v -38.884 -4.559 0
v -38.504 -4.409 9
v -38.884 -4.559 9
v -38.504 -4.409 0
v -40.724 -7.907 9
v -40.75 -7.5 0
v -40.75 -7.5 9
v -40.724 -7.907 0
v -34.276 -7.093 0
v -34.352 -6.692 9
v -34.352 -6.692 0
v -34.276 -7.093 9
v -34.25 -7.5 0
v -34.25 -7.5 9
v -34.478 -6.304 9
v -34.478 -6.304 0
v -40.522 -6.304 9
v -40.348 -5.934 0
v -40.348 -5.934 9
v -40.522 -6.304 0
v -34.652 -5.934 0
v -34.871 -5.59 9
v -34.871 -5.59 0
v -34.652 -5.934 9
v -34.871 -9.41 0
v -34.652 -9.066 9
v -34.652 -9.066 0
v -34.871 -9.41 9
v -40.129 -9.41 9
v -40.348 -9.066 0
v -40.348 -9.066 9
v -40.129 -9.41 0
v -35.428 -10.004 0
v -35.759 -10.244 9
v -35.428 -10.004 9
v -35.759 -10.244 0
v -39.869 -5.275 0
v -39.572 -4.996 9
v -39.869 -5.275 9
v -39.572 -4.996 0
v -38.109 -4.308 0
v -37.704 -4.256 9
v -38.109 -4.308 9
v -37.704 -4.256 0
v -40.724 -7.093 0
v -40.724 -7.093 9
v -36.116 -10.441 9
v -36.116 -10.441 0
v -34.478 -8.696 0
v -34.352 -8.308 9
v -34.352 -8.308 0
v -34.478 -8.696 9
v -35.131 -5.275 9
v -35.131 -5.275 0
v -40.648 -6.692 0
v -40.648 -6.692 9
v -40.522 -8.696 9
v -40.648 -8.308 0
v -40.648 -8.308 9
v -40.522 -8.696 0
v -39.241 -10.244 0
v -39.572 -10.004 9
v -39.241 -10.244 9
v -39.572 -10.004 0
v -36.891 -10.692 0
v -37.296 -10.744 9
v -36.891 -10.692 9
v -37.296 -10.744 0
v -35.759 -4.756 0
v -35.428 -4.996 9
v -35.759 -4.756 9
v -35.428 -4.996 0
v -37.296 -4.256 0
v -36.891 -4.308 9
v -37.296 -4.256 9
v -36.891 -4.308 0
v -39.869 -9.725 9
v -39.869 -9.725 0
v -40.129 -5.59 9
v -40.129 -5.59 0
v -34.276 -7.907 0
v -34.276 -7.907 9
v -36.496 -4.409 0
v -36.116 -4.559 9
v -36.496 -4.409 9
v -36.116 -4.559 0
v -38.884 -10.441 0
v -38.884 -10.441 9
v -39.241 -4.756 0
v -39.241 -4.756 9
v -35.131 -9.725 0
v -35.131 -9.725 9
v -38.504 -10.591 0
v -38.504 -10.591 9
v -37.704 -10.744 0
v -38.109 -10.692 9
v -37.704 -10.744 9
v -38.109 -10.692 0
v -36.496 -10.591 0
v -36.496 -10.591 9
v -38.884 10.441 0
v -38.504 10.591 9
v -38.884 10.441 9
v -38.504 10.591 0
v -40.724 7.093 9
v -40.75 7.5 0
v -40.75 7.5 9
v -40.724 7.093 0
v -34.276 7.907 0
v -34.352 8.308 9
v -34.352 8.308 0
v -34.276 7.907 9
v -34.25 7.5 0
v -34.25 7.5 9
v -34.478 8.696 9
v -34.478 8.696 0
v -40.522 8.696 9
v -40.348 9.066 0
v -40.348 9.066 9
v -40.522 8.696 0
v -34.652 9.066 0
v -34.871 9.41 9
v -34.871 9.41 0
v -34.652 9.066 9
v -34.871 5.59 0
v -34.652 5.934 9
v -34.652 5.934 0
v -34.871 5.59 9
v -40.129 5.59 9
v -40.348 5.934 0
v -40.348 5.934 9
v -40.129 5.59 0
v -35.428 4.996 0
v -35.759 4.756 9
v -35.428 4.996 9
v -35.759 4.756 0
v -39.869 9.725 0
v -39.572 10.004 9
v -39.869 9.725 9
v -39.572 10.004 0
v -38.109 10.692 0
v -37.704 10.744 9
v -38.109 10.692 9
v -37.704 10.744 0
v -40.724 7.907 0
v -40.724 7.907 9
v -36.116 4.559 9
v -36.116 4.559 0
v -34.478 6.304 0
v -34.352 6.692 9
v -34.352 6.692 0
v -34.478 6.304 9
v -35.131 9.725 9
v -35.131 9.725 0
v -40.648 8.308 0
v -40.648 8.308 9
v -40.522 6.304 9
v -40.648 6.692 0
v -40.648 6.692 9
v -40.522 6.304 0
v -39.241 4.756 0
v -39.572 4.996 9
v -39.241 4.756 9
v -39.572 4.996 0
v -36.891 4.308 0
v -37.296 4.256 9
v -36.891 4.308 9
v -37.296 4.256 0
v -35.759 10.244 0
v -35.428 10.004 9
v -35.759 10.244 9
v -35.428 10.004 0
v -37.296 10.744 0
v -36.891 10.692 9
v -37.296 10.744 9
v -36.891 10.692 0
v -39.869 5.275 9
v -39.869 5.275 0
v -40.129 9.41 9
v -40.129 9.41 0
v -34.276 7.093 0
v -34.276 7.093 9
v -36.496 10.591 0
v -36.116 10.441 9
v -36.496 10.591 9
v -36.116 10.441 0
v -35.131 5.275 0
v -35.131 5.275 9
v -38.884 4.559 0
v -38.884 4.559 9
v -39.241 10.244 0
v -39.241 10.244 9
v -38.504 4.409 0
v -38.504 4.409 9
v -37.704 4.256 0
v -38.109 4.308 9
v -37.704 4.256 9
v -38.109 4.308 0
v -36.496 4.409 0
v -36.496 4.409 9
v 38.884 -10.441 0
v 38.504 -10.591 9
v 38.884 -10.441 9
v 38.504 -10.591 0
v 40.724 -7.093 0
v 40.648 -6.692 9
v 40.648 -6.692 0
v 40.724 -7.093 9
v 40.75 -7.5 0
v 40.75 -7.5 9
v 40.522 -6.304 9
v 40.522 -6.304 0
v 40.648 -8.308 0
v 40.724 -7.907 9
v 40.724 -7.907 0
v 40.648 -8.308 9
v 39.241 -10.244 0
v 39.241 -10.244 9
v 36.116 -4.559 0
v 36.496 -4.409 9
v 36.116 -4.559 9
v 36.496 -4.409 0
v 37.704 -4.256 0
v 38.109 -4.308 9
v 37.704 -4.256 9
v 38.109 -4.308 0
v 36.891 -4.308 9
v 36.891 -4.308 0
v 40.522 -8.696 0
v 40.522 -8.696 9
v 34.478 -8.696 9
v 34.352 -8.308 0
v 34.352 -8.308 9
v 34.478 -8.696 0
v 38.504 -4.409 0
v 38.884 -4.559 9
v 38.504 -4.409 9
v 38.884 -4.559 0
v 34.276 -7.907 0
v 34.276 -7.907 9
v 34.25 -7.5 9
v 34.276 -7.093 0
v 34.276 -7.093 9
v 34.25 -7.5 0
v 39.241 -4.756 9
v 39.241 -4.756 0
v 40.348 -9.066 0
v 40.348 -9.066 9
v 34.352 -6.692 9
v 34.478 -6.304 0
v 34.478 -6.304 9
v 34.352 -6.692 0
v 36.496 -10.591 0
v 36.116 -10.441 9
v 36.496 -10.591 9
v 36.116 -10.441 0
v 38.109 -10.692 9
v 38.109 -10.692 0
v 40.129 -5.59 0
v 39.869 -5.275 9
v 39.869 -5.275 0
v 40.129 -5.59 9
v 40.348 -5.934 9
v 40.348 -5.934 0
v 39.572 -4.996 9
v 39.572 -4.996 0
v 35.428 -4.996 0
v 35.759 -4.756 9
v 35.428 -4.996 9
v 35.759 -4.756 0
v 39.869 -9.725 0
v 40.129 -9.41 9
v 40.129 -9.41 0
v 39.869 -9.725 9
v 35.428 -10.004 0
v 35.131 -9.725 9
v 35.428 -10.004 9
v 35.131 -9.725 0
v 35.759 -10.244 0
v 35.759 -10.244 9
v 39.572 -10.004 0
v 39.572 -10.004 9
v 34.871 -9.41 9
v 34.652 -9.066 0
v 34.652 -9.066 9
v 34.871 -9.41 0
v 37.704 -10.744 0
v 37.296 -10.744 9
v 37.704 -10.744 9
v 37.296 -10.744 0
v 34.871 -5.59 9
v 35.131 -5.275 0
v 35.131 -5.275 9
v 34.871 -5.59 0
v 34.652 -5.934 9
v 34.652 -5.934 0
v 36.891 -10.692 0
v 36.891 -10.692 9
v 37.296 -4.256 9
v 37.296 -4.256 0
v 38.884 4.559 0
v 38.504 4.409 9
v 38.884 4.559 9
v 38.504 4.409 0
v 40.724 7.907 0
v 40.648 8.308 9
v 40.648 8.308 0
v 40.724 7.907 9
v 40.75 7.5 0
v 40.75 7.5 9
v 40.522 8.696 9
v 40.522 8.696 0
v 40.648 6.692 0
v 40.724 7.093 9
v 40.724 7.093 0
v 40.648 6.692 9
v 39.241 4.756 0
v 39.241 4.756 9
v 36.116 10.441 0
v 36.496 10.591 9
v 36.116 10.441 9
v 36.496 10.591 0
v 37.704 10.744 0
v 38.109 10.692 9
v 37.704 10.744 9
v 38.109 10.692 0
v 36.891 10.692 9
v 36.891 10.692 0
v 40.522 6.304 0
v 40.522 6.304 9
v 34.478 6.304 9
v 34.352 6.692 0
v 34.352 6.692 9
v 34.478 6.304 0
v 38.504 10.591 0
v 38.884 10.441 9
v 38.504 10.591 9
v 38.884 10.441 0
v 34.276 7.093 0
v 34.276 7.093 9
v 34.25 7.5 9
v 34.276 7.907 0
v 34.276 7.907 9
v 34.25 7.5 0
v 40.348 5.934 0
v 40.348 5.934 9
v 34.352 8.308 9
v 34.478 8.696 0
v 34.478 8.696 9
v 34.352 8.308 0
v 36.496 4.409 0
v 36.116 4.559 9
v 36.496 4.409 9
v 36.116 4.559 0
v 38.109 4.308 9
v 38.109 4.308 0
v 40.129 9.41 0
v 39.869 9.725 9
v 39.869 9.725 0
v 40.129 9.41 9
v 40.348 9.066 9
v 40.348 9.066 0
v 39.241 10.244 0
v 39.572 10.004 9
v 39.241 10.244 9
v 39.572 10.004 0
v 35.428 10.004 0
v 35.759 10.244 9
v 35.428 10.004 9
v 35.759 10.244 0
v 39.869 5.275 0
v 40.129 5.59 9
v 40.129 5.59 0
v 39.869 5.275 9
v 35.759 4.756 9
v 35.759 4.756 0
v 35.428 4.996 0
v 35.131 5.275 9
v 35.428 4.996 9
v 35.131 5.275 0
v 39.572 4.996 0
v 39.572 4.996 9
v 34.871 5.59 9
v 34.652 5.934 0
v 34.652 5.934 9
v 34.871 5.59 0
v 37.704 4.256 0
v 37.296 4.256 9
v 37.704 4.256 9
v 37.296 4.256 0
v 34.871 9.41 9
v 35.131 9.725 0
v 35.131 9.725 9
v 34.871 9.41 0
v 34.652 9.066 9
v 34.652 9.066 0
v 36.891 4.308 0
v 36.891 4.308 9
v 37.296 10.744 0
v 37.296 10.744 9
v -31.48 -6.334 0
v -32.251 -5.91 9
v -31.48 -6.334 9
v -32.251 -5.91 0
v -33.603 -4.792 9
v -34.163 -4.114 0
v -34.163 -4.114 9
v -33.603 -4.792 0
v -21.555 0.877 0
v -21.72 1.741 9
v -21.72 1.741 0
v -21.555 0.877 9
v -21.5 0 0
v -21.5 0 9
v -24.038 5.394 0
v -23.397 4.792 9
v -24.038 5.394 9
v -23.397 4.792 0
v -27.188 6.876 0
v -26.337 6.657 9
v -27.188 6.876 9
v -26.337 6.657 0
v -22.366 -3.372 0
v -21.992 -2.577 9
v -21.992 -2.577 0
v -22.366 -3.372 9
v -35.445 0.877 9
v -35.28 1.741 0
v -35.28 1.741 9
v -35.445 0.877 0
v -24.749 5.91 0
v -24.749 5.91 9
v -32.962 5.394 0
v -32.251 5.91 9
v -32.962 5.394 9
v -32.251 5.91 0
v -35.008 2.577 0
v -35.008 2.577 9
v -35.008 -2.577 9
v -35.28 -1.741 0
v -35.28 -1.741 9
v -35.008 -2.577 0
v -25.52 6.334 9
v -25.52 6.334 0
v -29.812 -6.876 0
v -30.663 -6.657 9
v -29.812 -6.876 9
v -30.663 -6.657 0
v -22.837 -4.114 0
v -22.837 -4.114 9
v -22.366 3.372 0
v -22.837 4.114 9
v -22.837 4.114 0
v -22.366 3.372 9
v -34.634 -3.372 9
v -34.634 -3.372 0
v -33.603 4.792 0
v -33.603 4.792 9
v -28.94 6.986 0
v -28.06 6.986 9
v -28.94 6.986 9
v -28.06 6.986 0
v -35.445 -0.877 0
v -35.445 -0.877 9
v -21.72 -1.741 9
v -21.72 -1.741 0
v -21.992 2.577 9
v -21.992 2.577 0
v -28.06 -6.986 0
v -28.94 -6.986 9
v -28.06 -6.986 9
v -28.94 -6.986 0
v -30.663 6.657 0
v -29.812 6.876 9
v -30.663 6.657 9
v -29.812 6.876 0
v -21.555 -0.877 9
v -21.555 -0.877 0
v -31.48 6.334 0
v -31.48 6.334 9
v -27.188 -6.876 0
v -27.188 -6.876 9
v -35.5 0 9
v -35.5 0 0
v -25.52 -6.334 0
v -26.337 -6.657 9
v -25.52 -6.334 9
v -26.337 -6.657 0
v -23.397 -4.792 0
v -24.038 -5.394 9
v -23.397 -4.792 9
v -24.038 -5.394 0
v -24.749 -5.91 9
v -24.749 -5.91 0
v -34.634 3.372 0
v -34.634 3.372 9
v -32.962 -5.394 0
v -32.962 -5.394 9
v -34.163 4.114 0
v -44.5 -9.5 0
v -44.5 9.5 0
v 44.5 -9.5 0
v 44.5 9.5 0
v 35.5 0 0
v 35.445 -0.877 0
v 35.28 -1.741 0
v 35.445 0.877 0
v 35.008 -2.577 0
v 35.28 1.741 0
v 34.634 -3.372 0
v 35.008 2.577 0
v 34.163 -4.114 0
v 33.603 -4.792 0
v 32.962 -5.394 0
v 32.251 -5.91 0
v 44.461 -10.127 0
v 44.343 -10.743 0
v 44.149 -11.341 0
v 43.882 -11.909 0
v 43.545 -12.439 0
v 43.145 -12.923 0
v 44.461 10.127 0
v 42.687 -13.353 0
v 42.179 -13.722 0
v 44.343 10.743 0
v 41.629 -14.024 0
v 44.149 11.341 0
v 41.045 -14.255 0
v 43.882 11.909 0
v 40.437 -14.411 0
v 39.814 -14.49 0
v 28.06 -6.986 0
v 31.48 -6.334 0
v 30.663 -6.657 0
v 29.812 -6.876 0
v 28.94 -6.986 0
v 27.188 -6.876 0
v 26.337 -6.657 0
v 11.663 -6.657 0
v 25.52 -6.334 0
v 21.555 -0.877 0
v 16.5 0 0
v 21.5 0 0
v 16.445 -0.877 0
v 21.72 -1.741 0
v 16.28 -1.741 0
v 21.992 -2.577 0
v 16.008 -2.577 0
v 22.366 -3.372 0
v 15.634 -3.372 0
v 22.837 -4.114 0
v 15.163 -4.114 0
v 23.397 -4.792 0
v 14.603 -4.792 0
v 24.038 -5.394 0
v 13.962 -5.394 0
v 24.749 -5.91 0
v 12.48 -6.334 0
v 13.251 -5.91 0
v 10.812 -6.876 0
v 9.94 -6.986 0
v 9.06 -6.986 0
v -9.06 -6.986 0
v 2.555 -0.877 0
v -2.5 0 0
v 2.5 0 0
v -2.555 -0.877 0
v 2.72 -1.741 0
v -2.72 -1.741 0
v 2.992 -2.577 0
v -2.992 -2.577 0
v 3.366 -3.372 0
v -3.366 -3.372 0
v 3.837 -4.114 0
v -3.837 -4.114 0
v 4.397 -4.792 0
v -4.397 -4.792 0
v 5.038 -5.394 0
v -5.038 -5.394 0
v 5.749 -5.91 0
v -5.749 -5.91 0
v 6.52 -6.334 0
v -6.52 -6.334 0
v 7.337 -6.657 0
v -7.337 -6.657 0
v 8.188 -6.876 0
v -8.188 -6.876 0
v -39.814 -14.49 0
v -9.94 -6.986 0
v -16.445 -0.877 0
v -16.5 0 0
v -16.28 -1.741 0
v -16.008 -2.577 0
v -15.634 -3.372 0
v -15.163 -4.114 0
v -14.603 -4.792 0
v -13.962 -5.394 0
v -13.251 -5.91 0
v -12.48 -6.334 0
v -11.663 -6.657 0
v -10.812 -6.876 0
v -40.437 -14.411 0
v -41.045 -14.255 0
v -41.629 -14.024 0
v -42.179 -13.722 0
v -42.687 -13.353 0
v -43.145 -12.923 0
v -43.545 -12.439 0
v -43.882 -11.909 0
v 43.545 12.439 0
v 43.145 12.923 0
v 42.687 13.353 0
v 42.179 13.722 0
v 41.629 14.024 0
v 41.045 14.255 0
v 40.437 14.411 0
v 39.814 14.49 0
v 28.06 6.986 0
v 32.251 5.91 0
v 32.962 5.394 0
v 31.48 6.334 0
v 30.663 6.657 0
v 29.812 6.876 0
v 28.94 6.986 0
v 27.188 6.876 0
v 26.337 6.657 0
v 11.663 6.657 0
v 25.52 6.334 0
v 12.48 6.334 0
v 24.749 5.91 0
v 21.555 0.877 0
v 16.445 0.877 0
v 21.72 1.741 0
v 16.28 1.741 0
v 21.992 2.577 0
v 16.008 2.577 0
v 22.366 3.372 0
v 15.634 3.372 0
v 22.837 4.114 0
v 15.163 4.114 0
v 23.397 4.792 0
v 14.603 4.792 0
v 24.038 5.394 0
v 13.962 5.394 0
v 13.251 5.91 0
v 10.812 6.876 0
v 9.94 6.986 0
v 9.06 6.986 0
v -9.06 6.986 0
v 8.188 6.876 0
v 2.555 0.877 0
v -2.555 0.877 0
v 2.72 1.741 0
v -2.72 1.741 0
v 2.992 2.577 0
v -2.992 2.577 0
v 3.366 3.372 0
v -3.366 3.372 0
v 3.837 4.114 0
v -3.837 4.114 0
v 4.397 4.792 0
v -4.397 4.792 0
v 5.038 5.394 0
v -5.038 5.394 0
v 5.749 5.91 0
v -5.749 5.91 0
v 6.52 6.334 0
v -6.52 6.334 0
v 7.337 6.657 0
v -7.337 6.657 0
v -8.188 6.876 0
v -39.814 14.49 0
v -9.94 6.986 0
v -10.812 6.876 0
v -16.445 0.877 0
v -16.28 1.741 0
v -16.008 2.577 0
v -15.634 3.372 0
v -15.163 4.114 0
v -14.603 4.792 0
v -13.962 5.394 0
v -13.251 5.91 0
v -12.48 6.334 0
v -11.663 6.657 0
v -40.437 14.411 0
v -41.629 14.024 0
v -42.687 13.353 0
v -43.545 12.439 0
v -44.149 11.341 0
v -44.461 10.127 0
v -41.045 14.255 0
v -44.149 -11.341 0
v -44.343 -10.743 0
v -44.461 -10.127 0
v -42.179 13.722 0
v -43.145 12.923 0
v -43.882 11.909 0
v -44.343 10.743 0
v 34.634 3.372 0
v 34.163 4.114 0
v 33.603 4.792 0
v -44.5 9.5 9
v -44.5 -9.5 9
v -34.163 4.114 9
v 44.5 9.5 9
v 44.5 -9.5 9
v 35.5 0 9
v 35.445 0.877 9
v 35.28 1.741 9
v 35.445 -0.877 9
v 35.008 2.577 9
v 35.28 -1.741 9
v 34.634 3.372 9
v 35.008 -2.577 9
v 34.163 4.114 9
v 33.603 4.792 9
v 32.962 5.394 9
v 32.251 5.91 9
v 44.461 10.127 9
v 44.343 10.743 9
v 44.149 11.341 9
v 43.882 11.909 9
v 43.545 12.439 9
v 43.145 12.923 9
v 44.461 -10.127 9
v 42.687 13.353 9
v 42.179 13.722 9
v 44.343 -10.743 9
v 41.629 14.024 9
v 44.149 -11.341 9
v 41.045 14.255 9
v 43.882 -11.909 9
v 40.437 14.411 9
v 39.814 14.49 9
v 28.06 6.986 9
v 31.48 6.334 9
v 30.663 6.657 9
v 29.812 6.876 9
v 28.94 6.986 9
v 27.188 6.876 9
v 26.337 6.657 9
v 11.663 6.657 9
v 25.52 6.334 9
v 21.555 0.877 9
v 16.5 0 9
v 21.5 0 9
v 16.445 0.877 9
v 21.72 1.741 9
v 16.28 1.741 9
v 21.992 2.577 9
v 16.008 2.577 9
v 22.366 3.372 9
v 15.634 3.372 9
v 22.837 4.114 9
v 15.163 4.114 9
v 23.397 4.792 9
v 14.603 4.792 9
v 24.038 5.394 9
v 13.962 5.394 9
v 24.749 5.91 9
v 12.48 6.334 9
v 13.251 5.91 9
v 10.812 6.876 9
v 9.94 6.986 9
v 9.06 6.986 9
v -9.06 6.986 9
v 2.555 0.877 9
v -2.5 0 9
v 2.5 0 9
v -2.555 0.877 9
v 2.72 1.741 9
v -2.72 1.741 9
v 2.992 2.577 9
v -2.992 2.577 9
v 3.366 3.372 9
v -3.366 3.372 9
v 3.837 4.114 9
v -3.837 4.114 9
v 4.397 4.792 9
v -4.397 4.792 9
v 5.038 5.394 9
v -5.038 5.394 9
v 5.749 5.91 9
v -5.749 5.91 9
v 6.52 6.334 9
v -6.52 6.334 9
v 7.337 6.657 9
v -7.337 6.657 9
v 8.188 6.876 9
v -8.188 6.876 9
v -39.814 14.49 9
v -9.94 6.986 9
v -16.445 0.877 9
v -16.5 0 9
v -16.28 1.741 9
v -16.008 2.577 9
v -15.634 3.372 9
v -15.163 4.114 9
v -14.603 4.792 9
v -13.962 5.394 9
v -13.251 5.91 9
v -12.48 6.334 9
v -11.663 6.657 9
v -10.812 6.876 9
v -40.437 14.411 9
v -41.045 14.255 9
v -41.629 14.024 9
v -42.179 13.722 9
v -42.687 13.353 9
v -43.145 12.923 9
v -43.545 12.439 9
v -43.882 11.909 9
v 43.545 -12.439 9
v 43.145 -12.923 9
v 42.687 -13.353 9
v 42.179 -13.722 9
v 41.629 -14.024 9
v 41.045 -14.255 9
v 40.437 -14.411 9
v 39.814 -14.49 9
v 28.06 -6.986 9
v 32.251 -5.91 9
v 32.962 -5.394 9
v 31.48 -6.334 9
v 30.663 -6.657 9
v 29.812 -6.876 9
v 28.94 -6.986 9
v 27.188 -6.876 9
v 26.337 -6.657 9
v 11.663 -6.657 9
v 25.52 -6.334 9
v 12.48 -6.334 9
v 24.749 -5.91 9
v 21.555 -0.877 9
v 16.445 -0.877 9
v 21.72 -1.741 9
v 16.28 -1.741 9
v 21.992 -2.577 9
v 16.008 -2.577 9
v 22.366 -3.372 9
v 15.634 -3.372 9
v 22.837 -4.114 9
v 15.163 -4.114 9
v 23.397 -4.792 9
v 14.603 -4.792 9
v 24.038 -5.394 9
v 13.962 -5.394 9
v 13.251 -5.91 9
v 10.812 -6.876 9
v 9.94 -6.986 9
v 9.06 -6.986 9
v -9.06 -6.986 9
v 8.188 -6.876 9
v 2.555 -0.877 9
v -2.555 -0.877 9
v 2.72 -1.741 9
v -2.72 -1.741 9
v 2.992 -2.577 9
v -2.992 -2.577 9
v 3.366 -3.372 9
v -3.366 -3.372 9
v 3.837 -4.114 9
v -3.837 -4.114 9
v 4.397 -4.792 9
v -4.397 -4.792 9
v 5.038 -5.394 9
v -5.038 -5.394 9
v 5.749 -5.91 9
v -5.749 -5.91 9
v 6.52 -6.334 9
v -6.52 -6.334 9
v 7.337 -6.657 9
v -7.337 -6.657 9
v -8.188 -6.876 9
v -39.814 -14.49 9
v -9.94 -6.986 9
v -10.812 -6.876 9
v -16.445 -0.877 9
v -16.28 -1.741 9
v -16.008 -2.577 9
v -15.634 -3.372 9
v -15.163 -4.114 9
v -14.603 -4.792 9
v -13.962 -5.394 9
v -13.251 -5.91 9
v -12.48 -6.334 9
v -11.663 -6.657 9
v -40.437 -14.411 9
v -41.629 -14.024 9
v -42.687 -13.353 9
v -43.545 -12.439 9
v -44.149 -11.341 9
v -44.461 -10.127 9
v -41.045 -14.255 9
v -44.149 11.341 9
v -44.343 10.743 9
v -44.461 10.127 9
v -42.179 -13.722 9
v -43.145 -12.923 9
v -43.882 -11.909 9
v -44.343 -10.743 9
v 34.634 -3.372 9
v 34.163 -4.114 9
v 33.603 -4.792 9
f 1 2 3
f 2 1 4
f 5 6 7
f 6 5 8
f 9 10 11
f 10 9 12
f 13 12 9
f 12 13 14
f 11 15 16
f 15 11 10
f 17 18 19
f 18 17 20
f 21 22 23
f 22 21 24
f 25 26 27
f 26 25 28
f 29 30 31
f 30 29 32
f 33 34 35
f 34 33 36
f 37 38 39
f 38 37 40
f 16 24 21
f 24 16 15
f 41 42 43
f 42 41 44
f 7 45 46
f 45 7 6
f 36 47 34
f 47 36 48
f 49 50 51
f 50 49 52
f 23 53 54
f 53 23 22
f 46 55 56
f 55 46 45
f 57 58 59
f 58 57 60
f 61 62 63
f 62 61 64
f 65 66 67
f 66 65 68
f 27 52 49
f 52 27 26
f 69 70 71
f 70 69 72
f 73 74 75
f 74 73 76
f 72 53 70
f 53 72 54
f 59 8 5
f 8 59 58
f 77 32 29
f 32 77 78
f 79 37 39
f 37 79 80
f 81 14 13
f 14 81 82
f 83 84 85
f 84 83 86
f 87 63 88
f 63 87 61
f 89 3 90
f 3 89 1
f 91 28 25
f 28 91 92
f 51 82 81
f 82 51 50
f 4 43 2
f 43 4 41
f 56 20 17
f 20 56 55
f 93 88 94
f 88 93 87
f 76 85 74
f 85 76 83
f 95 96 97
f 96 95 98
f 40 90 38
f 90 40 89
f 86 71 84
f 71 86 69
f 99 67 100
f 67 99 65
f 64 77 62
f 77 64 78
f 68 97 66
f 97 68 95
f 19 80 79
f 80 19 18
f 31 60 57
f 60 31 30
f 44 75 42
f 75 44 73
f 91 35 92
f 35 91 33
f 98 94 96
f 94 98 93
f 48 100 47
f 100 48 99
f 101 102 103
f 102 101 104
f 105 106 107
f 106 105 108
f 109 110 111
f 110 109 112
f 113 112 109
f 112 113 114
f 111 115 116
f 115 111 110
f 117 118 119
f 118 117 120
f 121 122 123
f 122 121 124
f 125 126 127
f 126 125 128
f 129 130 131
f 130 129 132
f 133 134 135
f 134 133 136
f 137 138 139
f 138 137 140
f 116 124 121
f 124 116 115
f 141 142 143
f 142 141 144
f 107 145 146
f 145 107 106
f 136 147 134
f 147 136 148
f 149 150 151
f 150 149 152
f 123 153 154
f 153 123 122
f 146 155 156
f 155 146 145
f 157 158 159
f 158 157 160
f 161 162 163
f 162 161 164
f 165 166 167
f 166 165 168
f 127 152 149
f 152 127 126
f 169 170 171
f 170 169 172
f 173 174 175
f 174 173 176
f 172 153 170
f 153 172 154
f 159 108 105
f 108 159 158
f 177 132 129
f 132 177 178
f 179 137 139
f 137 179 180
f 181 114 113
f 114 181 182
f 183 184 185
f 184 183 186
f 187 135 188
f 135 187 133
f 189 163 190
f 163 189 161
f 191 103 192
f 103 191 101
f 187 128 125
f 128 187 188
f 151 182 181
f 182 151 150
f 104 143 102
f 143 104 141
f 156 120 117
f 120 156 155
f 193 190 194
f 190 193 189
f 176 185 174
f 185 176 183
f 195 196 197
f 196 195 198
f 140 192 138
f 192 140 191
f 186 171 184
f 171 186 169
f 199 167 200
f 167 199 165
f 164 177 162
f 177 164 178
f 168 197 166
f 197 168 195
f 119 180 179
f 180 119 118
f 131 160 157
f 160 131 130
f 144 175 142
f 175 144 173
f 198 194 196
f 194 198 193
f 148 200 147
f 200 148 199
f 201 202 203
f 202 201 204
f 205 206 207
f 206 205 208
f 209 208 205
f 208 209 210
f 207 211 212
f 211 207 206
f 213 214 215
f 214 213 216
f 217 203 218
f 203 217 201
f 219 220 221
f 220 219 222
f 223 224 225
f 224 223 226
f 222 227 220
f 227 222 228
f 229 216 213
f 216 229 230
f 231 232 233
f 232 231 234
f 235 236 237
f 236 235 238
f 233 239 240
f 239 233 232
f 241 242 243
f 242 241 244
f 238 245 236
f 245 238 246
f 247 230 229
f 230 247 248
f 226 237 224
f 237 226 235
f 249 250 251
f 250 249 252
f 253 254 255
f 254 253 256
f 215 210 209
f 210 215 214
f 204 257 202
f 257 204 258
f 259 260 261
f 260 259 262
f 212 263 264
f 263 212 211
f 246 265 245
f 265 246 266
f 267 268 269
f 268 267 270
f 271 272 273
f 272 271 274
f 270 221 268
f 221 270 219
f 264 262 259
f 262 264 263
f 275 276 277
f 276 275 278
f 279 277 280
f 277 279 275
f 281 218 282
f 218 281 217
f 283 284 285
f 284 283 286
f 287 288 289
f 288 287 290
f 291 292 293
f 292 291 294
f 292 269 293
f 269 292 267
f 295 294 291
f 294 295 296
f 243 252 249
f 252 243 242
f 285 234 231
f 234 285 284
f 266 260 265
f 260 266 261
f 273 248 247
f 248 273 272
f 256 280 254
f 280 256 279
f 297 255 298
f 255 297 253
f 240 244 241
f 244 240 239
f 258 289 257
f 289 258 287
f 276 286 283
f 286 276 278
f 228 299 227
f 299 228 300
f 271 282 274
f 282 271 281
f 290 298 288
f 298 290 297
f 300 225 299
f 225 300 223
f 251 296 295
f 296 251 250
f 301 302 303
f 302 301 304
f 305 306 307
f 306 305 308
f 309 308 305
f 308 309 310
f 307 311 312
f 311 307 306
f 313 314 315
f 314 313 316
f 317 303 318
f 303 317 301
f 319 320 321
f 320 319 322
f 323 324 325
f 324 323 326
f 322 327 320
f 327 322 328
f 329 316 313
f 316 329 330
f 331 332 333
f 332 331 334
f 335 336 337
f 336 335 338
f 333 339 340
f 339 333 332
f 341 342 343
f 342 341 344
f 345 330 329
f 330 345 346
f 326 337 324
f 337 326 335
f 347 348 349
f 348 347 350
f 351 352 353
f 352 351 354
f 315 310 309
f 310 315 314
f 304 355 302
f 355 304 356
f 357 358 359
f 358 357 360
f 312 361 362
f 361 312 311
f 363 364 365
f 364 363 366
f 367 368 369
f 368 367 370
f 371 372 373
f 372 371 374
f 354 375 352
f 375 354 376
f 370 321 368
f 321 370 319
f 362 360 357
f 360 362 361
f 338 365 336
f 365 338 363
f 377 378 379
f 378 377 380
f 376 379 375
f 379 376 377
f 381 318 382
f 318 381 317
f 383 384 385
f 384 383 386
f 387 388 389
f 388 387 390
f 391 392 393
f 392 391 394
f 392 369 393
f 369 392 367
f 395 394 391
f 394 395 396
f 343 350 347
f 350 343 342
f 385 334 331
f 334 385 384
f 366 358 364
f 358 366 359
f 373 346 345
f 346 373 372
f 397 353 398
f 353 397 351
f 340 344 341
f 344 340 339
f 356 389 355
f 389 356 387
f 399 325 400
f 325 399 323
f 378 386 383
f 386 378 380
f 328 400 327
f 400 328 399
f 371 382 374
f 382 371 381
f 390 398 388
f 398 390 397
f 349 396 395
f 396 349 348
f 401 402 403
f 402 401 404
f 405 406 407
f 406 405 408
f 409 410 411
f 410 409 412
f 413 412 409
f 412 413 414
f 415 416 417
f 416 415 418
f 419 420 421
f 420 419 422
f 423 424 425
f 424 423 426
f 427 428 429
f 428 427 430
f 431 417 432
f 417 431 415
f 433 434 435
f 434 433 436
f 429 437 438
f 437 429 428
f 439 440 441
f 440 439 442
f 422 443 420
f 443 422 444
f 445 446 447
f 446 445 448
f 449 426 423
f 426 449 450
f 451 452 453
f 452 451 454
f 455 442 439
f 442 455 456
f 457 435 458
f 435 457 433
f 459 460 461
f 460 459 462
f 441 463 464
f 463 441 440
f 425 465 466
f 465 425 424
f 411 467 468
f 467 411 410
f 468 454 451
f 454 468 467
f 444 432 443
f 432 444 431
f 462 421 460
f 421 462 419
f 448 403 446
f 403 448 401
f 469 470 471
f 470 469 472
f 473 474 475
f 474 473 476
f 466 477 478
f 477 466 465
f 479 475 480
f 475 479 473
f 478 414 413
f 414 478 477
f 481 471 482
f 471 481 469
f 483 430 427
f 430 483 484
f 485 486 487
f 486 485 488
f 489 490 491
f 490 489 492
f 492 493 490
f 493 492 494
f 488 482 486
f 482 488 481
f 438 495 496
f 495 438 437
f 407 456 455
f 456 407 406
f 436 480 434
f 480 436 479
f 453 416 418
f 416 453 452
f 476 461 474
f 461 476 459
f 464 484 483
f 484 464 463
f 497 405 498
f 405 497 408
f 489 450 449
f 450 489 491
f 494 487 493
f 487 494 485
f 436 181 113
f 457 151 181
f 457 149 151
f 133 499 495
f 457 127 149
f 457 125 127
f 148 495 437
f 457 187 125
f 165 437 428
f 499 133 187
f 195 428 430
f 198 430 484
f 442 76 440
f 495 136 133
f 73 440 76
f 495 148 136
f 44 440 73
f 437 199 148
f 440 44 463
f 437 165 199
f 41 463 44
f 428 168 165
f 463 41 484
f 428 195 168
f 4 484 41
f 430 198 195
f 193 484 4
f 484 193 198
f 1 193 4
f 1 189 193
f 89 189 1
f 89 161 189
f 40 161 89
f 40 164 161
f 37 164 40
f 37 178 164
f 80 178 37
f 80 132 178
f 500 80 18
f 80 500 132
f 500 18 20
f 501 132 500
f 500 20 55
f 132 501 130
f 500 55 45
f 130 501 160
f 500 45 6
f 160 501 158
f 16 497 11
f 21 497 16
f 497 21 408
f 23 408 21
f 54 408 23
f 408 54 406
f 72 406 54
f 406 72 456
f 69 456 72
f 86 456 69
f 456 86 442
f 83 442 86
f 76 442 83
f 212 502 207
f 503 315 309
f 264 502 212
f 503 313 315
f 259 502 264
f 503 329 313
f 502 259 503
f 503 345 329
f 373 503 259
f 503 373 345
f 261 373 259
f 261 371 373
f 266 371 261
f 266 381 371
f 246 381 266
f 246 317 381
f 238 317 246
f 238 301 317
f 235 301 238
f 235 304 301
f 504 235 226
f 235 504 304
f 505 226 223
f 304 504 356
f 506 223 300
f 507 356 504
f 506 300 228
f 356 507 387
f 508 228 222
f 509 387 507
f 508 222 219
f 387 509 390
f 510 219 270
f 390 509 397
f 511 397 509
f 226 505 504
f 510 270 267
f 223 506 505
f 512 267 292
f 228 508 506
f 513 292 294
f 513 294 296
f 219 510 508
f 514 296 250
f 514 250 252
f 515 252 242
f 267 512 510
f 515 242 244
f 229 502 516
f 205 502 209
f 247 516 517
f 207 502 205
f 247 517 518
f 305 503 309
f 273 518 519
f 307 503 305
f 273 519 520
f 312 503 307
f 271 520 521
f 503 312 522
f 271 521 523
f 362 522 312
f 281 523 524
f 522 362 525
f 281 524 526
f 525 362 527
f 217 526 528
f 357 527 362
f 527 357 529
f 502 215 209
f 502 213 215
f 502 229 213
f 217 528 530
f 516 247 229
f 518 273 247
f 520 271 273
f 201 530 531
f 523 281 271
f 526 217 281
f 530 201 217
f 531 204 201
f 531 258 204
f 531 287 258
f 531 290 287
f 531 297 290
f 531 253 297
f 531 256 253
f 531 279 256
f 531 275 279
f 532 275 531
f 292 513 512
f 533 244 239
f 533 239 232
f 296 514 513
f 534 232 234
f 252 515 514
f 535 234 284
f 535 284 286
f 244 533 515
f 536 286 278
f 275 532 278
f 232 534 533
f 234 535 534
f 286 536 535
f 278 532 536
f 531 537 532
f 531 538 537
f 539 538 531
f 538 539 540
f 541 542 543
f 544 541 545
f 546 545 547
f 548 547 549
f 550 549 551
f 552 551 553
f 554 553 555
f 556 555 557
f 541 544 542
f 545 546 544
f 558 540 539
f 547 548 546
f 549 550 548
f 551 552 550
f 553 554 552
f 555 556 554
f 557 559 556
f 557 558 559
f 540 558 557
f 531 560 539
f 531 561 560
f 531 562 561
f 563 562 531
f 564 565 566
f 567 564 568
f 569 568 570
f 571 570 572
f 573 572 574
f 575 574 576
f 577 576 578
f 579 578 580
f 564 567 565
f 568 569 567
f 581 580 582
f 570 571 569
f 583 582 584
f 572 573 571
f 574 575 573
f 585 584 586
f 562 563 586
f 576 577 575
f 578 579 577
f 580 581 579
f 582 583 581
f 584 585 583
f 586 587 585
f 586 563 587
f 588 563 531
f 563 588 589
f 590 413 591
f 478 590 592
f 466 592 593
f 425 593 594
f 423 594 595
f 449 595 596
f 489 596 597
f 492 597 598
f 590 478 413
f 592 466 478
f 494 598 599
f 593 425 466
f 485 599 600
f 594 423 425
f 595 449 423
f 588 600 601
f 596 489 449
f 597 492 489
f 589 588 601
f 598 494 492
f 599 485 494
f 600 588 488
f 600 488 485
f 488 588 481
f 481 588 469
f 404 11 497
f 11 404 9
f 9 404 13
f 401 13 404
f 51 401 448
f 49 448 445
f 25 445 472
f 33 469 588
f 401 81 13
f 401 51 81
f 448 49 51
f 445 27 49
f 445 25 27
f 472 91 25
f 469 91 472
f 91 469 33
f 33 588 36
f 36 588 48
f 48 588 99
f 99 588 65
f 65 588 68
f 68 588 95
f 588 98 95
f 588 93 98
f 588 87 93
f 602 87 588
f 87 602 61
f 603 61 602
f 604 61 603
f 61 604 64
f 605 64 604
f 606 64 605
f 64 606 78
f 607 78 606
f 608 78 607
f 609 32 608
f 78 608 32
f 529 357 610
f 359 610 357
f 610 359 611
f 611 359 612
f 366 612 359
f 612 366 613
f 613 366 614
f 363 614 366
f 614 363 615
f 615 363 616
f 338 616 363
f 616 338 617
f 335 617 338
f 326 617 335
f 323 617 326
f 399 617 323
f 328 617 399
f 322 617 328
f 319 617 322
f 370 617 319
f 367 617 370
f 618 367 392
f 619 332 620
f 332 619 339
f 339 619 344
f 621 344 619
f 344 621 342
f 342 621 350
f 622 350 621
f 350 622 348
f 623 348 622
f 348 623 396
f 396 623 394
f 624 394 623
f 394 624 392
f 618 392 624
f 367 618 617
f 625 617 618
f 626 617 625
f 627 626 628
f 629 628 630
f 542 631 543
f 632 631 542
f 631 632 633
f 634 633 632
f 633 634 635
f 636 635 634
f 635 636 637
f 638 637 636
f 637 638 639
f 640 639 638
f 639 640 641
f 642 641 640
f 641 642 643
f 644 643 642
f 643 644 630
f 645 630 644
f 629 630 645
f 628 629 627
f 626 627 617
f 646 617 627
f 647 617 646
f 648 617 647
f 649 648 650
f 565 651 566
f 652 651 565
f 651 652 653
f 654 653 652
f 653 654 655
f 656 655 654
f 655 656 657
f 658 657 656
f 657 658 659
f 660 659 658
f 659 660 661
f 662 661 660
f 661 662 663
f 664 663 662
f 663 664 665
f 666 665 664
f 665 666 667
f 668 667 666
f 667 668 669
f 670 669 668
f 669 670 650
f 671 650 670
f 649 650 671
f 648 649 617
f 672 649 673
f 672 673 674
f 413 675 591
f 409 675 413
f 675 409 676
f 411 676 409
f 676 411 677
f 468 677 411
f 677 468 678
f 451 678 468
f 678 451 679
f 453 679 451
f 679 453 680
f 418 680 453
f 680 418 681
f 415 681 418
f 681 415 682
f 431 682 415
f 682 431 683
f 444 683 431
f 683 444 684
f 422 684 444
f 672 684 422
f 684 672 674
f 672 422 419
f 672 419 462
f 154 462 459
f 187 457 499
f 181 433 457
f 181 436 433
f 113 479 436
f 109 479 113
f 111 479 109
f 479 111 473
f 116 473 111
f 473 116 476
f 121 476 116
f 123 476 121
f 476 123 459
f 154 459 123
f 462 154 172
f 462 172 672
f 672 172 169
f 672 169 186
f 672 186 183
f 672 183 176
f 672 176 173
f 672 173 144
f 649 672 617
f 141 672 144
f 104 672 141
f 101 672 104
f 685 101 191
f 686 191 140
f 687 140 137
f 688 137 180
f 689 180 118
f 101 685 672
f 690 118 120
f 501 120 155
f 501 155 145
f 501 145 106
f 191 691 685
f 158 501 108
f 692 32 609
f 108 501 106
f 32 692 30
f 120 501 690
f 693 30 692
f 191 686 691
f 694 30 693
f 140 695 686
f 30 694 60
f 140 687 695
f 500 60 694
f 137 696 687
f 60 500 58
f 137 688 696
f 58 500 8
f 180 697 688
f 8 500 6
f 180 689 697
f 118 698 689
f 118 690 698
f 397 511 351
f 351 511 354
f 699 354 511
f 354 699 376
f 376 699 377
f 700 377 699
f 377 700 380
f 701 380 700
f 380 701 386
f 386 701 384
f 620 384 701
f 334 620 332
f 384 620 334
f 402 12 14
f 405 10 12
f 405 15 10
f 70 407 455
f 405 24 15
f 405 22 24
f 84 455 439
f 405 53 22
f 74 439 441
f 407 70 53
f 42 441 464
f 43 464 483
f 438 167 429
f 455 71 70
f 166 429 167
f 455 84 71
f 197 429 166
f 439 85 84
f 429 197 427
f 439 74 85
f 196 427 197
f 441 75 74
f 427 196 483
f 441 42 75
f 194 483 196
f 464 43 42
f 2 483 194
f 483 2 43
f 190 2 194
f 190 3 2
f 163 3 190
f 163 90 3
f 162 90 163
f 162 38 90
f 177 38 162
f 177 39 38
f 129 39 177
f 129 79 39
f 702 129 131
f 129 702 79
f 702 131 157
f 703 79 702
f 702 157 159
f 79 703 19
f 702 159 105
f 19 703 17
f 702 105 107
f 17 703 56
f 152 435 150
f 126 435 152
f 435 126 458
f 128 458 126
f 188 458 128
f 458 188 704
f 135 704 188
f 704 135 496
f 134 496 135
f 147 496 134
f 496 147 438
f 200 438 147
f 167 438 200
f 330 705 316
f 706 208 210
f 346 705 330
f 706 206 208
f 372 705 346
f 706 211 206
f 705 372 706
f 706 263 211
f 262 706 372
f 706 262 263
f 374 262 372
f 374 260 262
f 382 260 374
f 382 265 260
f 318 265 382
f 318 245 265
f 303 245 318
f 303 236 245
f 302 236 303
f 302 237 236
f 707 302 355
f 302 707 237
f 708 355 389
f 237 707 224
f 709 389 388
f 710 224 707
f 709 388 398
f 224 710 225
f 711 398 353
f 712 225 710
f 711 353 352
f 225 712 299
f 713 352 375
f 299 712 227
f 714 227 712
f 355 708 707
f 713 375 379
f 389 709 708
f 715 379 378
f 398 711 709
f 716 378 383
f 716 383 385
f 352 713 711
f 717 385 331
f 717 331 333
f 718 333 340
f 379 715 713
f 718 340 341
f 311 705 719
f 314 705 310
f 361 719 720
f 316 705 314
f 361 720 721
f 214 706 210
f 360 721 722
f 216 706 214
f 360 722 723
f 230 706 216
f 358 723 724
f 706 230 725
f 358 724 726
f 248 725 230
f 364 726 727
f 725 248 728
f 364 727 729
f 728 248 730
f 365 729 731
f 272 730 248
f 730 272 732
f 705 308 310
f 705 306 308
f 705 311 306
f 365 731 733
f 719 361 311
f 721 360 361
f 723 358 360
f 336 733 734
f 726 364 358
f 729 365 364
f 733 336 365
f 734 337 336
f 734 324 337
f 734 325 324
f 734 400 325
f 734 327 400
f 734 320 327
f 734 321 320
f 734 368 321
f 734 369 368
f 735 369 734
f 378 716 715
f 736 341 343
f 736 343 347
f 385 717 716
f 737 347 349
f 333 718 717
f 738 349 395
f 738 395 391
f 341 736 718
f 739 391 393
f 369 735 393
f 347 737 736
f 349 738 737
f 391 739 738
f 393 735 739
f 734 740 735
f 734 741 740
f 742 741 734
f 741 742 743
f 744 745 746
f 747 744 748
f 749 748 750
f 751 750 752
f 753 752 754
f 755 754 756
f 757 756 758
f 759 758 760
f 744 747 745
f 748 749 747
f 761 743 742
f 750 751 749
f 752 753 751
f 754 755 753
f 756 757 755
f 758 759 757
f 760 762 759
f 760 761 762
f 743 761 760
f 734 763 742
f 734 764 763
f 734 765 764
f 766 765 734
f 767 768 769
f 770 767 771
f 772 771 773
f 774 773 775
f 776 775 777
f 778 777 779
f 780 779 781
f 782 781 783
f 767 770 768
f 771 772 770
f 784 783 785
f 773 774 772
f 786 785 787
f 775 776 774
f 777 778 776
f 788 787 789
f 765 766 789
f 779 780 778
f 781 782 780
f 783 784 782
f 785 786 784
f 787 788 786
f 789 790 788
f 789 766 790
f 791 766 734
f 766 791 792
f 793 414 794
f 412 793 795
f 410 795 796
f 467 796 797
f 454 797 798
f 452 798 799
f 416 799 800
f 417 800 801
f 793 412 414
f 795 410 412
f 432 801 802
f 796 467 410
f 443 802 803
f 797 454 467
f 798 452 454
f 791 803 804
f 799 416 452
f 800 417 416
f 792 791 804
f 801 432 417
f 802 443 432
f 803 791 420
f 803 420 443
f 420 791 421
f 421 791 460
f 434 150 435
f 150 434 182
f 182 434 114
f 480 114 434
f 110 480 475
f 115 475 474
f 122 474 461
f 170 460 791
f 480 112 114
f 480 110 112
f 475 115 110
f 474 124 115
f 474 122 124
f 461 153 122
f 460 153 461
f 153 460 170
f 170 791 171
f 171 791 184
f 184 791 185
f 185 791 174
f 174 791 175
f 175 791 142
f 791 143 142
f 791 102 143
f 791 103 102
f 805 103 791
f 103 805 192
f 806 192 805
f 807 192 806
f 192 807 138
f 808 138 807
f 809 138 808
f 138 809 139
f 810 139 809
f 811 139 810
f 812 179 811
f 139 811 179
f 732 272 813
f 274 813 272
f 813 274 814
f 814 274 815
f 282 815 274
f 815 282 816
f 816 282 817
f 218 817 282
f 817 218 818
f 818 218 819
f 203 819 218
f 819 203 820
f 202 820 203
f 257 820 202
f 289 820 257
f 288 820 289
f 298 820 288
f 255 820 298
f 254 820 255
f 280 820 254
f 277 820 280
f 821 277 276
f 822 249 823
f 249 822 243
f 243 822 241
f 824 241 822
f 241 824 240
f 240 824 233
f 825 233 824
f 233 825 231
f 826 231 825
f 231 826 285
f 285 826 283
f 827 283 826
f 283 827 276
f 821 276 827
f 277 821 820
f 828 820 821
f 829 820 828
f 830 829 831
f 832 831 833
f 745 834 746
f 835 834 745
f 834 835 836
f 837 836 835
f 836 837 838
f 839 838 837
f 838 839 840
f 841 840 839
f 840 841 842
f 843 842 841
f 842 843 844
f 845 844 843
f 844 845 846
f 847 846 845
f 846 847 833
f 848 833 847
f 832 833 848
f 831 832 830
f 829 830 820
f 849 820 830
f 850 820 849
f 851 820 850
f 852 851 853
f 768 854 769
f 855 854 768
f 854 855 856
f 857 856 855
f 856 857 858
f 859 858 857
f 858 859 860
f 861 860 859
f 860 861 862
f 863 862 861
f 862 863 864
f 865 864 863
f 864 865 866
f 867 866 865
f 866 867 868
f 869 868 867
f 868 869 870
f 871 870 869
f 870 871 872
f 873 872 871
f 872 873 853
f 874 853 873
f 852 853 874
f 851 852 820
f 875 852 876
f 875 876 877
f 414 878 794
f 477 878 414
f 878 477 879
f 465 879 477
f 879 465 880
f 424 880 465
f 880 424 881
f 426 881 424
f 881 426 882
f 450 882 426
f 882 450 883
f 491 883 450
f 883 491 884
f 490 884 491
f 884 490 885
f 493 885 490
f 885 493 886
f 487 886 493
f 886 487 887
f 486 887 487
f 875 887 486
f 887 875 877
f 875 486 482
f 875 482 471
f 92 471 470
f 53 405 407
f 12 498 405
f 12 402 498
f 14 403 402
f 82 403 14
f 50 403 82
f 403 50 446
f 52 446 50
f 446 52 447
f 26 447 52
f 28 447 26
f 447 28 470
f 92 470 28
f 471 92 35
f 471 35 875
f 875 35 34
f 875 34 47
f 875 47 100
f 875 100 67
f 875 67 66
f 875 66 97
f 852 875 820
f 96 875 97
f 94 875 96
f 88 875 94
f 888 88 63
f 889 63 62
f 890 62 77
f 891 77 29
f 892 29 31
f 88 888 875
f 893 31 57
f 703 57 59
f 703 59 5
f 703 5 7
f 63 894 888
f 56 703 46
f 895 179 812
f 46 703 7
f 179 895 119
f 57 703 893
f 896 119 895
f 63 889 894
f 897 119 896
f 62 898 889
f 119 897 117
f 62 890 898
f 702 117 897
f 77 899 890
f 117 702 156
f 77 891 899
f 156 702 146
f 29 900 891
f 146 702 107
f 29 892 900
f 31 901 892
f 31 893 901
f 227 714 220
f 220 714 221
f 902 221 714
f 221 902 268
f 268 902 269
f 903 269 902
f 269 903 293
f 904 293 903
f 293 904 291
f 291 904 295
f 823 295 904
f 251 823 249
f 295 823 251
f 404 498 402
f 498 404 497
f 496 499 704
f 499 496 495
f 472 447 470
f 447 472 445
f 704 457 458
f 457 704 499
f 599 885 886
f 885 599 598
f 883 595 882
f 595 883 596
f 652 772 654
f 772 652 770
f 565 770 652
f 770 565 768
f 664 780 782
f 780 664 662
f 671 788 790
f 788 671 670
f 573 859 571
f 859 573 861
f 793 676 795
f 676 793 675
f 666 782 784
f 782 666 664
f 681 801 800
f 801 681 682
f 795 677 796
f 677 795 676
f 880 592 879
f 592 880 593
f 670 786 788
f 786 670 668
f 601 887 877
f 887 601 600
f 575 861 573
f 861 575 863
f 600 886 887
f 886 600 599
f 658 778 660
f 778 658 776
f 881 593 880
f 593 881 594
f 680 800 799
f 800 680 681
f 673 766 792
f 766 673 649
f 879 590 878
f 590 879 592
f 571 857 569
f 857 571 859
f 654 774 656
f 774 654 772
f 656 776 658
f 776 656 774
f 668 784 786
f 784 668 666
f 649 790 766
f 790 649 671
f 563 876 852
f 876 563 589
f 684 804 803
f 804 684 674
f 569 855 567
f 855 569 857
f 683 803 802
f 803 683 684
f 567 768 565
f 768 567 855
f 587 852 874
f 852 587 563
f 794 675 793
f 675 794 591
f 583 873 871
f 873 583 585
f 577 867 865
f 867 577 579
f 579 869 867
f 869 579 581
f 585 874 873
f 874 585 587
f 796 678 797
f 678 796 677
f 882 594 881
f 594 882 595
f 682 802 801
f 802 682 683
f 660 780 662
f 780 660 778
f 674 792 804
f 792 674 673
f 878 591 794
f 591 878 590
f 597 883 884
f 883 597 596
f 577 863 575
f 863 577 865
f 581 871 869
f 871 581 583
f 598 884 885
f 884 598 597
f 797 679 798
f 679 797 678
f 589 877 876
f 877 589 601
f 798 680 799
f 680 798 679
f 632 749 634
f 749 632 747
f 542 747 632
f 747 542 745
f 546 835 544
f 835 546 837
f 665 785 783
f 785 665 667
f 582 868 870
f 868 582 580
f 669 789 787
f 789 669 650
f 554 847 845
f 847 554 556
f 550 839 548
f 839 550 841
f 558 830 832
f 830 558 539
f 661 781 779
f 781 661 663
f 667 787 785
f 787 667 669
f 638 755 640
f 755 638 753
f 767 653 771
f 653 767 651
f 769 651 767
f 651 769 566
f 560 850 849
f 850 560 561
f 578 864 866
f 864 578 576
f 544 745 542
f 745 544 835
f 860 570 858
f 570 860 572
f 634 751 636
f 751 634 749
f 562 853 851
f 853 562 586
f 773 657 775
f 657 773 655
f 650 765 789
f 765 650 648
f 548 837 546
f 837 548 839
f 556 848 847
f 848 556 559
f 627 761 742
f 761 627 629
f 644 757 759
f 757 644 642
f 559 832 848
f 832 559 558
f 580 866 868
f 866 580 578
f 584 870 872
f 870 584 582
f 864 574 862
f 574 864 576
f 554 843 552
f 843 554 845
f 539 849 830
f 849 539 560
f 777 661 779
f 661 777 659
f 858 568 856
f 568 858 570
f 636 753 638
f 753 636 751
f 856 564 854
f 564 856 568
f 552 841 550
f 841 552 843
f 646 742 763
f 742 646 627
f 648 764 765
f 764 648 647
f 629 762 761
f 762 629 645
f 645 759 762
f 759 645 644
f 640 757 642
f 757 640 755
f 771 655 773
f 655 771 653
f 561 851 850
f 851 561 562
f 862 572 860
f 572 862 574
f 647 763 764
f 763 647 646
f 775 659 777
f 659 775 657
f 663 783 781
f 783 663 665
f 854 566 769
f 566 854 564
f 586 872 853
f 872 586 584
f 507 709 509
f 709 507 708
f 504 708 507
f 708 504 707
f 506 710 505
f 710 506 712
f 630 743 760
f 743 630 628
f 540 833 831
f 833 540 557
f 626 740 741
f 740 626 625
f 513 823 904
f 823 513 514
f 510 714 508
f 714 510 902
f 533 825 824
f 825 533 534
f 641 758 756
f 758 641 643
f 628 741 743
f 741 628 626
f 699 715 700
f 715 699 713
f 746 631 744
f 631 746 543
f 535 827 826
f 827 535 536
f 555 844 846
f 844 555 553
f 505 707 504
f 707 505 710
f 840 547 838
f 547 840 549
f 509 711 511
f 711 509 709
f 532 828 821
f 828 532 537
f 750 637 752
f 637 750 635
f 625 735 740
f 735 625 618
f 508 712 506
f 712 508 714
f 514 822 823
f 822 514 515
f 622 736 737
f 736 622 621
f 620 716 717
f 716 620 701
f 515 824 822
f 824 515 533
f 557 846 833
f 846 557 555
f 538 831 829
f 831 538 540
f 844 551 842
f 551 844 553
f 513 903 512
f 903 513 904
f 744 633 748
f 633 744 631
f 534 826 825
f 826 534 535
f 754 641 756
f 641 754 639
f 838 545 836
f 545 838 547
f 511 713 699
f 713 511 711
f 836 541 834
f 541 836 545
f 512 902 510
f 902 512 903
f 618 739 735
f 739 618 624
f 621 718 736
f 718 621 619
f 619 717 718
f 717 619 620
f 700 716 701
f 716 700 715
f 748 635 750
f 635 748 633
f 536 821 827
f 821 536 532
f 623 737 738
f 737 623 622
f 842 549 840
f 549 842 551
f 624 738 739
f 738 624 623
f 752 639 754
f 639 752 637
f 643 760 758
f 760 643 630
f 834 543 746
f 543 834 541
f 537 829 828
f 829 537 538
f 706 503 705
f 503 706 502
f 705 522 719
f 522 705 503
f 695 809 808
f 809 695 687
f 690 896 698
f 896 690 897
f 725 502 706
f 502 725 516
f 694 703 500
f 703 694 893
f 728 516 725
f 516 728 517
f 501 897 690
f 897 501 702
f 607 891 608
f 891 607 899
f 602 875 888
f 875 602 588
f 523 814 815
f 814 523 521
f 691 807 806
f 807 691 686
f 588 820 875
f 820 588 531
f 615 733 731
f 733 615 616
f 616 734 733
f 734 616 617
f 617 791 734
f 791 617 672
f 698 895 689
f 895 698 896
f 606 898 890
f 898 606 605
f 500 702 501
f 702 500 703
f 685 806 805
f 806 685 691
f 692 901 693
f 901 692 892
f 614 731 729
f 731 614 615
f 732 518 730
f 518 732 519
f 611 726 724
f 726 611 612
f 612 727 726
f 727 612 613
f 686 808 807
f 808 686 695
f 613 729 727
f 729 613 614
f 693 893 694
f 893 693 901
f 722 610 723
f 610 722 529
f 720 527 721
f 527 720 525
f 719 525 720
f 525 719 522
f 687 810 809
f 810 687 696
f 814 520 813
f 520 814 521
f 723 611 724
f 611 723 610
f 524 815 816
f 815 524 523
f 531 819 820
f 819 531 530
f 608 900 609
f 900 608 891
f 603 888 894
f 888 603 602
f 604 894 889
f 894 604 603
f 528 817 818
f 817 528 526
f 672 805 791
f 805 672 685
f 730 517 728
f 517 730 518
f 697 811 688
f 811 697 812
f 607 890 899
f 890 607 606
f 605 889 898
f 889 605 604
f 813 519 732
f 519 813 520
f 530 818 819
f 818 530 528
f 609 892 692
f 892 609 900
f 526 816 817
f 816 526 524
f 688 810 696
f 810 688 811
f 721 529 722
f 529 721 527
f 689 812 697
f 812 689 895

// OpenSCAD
$fn = 50;


difference() {
	union() {
		hull() {
			translate(v = [-39.5000000000, 9.5000000000, 0]) {
				cylinder(h = 9, r = 5);
			}
			translate(v = [39.5000000000, 9.5000000000, 0]) {
				cylinder(h = 9, r = 5);
			}
			translate(v = [-39.5000000000, -9.5000000000, 0]) {
				cylinder(h = 9, r = 5);
			}
			translate(v = [39.5000000000, -9.5000000000, 0]) {
				cylinder(h = 9, r = 5);
			}
		}
	}
	union() {
		#translate(v = [-37.5000000000, -7.5000000000, -100.0000000000]) {
			cylinder(h = 200, r = 3.2500000000);
		}
		#translate(v = [-37.5000000000, 7.5000000000, -100.0000000000]) {
			cylinder(h = 200, r = 3.2500000000);
		}
		#translate(v = [37.5000000000, -7.5000000000, -100.0000000000]) {
			cylinder(h = 200, r = 3.2500000000);
		}
		#translate(v = [37.5000000000, 7.5000000000, -100.0000000000]) {
			cylinder(h = 200, r = 3.2500000000);
		}
		#translate(v = [-28.5000000000, 0, 0]) {
			cylinder(h = 9, r = 7.0000000000);
		}
		#translate(v = [-9.5000000000, 0, 0]) {
			cylinder(h = 9, r = 7.0000000000);
		}
		#translate(v = [9.5000000000, 0, 0]) {
			cylinder(h = 9, r = 7.0000000000);
		}
		#translate(v = [28.5000000000, 0, 0]) {
			cylinder(h = 9, r = 7.0000000000);
		}
	}
}
